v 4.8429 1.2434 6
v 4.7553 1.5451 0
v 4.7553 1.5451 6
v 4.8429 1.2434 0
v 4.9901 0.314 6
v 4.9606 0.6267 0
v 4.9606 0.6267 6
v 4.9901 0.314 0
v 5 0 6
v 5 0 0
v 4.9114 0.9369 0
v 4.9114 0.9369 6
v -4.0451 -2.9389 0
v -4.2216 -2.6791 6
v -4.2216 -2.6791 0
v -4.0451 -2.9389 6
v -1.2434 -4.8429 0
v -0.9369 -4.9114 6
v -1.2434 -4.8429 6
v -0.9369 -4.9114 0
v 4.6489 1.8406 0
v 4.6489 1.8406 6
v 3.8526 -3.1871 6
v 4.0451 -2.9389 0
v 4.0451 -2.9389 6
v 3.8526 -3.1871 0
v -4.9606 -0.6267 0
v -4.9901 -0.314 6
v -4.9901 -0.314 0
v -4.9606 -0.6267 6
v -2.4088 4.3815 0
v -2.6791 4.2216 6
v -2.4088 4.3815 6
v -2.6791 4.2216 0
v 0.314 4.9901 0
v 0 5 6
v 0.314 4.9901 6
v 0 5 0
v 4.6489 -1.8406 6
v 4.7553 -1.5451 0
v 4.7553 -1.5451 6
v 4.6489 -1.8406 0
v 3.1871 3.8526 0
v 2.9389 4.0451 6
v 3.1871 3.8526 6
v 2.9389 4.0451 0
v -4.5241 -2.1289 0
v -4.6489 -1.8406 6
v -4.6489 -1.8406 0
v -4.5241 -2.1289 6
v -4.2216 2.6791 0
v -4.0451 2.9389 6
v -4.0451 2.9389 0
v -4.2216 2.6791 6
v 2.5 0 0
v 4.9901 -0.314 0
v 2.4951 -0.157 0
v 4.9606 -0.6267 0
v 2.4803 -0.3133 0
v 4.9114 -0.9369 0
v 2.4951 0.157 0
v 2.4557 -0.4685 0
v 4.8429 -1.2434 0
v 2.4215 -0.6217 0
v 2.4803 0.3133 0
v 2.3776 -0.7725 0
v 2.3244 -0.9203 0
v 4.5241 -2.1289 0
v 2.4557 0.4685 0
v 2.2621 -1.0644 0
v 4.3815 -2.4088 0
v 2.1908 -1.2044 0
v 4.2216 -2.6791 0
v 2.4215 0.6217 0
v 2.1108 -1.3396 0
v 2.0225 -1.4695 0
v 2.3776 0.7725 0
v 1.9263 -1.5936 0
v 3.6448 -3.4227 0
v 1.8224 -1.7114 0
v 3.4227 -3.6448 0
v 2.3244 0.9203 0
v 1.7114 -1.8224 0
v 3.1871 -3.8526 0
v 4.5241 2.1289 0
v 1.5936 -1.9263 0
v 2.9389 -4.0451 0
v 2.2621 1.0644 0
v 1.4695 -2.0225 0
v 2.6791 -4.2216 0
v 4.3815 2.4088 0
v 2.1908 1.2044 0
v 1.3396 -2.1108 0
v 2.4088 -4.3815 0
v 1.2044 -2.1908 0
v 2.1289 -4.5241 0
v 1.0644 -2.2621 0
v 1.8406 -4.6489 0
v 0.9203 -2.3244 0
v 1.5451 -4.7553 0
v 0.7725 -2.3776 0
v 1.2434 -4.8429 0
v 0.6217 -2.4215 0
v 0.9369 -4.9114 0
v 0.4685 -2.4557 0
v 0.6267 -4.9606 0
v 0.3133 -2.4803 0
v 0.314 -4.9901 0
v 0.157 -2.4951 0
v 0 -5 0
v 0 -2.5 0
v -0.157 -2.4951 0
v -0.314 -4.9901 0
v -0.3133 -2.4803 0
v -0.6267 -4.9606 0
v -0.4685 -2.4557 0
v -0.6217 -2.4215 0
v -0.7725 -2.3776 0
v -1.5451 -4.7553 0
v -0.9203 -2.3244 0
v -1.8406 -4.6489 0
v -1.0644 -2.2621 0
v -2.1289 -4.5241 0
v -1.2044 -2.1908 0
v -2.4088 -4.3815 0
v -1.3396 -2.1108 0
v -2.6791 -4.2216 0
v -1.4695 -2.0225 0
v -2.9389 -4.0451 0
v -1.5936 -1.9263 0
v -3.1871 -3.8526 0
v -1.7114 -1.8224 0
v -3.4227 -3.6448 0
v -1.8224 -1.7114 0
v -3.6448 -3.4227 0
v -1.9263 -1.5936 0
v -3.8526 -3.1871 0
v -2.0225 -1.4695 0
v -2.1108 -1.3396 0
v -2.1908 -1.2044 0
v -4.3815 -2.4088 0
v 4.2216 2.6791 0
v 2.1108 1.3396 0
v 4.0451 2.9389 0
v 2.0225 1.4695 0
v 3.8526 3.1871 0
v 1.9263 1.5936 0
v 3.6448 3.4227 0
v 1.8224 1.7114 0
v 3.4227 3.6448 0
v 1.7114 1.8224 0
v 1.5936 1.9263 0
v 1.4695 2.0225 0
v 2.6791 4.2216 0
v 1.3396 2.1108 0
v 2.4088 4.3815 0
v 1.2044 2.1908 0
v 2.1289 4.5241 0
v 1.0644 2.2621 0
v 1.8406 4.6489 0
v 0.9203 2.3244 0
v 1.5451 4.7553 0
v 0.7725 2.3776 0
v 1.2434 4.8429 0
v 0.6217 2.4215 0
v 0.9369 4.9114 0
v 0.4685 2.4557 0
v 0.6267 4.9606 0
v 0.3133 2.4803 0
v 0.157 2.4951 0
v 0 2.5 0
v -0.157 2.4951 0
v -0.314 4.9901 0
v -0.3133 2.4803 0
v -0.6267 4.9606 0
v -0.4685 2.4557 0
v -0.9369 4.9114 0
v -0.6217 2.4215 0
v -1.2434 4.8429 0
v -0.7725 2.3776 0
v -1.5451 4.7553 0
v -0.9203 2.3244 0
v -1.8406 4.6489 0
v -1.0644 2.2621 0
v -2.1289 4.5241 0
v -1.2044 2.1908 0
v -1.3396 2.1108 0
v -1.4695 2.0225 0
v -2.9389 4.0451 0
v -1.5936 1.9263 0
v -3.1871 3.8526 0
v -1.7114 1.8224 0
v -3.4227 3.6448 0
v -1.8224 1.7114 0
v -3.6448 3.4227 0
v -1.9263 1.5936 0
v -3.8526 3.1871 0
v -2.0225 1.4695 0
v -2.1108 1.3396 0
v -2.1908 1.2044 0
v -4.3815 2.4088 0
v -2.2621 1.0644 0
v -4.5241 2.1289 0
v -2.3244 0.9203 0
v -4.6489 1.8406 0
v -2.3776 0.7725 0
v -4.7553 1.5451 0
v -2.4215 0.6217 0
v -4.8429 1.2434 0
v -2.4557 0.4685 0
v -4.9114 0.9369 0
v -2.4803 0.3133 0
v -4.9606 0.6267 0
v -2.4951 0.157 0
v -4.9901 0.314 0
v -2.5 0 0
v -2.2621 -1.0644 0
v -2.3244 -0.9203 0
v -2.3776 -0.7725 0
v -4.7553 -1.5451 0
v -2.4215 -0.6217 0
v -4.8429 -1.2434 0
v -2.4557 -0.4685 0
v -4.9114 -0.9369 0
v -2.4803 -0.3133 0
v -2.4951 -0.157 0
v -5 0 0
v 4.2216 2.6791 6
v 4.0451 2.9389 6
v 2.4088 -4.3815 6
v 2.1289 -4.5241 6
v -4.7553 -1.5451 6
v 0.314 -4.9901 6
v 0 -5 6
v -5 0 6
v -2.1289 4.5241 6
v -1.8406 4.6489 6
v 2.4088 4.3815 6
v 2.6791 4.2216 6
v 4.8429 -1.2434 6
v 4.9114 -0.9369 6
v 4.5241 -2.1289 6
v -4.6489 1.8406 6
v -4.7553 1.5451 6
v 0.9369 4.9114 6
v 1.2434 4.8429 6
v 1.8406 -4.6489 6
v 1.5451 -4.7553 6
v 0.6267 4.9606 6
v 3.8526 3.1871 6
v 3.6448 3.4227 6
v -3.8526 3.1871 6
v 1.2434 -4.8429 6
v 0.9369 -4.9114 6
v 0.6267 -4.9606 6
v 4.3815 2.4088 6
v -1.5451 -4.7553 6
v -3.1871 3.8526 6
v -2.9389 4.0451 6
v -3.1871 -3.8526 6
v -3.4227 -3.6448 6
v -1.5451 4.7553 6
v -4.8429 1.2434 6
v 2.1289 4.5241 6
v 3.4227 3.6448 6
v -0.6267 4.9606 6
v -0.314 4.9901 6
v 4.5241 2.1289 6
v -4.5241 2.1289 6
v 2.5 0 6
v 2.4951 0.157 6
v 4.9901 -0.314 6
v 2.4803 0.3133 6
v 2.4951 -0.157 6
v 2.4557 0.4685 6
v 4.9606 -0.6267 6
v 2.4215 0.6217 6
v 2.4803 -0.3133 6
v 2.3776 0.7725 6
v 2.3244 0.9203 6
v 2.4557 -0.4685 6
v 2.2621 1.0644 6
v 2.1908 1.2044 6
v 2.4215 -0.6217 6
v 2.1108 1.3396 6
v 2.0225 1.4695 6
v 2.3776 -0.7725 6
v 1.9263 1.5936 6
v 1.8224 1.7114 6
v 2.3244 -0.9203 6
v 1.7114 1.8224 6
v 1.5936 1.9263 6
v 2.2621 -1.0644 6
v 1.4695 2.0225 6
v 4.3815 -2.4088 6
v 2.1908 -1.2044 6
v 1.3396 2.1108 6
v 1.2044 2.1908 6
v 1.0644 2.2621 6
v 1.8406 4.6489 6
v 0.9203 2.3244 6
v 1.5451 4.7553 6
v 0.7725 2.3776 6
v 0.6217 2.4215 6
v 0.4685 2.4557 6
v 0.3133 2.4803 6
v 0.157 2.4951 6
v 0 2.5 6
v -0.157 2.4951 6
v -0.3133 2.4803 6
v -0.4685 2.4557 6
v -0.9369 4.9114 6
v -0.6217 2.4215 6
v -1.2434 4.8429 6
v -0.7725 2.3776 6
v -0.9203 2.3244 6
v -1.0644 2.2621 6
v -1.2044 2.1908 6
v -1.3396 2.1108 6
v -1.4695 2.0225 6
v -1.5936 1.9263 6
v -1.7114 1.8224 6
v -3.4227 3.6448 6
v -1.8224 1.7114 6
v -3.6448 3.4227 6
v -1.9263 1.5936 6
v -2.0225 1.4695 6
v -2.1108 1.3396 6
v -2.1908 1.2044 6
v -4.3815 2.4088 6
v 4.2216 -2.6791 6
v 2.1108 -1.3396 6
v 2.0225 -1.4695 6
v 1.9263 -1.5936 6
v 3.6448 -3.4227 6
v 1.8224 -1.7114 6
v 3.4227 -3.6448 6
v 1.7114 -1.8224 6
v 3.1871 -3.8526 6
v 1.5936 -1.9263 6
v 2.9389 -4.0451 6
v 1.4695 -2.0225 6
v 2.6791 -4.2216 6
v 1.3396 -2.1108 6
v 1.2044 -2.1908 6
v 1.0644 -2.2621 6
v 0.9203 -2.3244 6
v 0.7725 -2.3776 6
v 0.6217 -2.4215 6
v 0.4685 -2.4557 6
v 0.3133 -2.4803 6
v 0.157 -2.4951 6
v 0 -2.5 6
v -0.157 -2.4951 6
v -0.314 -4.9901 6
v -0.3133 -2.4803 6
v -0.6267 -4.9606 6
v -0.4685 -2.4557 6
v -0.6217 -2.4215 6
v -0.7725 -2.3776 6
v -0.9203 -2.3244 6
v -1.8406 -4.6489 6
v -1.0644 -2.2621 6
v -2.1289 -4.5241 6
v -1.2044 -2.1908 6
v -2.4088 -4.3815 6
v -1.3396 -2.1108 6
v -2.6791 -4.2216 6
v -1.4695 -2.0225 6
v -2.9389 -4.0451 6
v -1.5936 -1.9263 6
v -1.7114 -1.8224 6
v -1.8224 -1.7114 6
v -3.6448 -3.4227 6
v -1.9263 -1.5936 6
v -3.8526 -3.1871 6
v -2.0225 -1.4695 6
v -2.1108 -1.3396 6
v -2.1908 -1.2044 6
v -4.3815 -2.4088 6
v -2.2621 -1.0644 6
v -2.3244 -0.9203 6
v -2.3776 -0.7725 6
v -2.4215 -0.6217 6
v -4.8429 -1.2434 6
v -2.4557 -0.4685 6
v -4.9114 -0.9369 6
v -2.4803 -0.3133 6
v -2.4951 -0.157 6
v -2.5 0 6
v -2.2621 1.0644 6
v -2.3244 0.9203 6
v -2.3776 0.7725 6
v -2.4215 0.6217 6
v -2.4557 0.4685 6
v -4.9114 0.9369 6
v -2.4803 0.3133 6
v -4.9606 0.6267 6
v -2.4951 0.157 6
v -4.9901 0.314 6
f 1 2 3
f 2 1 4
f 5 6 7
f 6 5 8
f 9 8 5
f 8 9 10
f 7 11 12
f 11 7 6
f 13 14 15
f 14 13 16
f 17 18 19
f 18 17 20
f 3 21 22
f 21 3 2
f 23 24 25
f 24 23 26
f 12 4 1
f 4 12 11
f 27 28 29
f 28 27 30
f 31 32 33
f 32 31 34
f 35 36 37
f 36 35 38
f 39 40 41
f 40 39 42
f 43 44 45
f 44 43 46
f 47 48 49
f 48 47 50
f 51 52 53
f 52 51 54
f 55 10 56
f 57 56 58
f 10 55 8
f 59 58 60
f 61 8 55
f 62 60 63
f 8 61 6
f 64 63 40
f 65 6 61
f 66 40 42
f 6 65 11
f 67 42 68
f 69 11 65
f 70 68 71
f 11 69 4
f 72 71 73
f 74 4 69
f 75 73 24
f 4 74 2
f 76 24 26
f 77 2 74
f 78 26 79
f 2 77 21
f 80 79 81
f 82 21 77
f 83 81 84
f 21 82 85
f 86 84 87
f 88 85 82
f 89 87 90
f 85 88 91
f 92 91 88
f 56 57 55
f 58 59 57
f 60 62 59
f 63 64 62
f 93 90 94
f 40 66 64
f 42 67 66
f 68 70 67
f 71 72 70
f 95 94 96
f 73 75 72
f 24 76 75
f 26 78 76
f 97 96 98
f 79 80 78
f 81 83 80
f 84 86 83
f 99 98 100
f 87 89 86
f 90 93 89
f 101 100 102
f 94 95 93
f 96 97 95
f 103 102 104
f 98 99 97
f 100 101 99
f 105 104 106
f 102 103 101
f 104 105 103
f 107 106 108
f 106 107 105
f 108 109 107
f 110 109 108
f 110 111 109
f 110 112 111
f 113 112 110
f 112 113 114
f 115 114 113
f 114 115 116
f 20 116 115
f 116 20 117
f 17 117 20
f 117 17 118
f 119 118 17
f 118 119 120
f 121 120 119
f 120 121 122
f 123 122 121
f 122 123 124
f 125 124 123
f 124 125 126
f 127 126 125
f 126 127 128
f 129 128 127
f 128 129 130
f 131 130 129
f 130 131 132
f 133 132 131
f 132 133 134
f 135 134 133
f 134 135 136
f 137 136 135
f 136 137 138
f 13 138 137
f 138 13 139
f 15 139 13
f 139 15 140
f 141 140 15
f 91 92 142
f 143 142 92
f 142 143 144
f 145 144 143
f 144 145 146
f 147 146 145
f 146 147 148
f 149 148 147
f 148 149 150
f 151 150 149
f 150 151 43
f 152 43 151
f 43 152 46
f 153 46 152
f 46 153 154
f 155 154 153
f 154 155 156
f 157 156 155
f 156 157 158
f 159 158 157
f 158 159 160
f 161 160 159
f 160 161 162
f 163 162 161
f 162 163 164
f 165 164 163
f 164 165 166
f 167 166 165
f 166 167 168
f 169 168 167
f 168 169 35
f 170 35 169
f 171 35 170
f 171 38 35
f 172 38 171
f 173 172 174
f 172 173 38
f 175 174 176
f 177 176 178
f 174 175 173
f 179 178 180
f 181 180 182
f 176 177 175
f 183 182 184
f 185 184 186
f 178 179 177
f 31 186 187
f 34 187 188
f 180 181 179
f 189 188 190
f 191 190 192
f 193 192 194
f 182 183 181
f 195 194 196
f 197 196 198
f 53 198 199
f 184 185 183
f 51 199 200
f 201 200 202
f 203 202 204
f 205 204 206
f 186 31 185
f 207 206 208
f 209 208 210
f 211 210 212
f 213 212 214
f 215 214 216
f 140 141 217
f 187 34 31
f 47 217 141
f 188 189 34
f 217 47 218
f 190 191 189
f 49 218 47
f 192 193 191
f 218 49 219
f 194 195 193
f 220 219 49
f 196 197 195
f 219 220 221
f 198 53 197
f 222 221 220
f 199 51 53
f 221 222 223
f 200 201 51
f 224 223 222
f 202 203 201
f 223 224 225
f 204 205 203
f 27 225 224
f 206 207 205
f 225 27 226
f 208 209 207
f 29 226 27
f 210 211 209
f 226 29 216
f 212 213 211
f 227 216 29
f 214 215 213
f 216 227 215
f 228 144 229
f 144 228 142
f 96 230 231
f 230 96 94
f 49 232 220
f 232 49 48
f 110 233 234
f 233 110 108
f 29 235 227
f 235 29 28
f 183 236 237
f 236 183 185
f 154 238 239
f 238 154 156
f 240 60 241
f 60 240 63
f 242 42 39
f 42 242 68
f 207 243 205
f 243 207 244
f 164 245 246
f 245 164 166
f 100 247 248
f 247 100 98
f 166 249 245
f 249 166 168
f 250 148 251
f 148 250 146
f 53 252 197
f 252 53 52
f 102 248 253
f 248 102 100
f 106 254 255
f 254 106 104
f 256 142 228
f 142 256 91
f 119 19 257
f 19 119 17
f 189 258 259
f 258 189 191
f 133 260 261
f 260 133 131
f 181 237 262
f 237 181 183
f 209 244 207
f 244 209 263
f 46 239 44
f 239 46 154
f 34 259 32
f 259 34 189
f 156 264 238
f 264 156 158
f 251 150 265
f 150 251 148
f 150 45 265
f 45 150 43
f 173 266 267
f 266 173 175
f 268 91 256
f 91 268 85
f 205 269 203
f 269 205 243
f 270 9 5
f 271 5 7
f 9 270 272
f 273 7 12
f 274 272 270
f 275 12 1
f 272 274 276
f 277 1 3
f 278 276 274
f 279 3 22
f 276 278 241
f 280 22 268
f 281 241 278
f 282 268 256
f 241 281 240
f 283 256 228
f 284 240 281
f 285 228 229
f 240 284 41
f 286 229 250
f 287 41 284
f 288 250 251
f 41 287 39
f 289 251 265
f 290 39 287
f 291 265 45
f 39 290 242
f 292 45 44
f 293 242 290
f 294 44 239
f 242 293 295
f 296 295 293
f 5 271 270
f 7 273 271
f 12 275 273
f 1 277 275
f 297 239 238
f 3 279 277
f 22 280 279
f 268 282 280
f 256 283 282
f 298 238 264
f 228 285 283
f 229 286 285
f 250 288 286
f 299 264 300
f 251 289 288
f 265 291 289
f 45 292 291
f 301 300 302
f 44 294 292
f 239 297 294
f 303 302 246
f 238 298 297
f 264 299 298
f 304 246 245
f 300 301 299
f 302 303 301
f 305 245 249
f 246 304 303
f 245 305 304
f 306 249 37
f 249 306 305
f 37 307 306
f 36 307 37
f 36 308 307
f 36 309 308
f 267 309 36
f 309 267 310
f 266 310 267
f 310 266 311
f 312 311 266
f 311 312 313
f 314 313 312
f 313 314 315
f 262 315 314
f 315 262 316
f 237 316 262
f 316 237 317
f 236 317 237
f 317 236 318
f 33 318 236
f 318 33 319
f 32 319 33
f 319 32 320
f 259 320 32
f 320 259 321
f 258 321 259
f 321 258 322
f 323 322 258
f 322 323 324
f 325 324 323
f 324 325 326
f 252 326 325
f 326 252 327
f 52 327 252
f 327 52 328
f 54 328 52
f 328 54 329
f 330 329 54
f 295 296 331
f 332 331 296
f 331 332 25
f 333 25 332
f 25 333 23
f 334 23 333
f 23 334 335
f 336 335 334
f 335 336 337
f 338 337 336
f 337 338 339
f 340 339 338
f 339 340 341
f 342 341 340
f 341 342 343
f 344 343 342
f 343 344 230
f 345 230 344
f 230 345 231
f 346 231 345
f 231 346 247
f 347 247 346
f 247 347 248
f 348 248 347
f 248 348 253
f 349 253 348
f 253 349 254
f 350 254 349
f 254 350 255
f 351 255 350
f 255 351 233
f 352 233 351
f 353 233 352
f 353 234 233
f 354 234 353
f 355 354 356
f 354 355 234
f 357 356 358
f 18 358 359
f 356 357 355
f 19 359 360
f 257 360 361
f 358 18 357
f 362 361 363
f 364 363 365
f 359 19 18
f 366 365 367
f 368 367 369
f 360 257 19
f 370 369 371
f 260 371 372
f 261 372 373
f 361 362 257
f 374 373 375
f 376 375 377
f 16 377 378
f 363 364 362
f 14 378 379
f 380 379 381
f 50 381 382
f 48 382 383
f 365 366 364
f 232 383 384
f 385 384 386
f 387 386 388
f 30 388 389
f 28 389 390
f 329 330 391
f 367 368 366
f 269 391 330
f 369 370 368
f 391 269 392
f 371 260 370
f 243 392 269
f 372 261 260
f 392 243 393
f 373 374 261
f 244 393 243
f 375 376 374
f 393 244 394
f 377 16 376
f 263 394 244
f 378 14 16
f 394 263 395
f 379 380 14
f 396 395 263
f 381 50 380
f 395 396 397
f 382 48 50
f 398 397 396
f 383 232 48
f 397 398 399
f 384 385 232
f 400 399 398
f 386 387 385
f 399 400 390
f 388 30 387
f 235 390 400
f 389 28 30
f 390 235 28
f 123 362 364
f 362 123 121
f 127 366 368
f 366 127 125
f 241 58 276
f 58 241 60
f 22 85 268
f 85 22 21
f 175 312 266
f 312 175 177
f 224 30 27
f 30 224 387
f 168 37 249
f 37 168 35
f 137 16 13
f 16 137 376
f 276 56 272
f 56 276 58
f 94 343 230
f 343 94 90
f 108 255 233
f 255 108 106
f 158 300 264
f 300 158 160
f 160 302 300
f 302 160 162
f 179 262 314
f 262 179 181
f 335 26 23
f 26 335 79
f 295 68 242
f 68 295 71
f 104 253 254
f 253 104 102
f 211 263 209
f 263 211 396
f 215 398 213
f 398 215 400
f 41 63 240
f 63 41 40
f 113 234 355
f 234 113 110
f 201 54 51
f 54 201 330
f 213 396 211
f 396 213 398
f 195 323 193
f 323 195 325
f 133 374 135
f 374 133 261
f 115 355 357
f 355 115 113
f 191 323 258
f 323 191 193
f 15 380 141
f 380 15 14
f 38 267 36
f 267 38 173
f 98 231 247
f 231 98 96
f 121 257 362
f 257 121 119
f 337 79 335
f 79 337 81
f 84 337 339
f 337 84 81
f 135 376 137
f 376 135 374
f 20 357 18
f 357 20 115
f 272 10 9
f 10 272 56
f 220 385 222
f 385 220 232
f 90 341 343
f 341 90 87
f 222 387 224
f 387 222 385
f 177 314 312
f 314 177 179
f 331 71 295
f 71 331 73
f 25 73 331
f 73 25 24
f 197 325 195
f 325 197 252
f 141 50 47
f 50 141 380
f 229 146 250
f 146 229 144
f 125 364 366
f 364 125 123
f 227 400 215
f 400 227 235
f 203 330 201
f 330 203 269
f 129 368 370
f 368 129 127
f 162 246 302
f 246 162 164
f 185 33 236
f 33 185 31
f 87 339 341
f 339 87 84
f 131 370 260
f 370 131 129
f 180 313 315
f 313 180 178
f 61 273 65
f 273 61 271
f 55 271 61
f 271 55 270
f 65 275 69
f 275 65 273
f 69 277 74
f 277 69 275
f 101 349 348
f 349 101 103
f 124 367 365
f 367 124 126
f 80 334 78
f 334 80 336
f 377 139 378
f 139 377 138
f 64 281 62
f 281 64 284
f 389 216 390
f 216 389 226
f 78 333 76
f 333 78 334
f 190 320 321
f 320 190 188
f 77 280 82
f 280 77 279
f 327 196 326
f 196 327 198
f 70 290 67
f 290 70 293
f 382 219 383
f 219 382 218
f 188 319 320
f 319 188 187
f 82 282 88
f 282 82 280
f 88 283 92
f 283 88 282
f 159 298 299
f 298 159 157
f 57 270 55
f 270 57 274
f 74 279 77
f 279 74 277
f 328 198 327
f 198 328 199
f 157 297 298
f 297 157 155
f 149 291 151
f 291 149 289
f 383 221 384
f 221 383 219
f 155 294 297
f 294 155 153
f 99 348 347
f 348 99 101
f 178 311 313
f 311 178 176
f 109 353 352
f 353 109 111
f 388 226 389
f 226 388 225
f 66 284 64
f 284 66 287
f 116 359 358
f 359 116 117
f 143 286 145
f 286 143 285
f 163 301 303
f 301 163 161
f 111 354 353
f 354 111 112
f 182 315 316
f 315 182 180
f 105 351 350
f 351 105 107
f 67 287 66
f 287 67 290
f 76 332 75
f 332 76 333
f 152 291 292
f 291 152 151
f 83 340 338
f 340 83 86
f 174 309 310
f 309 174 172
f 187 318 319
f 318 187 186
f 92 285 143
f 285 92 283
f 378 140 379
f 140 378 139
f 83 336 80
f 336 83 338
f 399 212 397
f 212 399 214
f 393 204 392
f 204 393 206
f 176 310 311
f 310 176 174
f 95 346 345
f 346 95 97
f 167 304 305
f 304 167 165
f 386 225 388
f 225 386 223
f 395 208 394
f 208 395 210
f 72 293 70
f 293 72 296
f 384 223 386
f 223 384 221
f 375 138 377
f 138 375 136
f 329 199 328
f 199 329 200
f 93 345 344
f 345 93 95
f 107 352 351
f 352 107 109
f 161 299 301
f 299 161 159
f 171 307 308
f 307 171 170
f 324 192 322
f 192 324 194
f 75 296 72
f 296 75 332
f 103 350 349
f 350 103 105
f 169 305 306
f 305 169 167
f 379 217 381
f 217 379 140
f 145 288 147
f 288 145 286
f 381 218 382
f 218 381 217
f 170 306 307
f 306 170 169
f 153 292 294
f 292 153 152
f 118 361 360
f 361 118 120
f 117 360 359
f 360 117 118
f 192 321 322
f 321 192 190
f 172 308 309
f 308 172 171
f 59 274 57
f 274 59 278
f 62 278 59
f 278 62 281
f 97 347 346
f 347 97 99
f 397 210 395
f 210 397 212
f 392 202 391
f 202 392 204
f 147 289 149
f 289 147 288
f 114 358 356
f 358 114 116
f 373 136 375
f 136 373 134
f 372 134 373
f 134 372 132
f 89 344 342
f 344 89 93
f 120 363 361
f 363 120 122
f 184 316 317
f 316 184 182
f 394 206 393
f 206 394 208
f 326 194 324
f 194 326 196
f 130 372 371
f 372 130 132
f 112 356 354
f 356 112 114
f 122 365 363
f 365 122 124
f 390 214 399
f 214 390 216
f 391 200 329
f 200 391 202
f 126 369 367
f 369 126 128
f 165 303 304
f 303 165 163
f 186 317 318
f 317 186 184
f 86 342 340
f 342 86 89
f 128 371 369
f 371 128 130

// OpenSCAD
$fn = 100;
difference() {
    cylinder(r=5, h=6);
    cylinder(r=2.5, h=6);
}
